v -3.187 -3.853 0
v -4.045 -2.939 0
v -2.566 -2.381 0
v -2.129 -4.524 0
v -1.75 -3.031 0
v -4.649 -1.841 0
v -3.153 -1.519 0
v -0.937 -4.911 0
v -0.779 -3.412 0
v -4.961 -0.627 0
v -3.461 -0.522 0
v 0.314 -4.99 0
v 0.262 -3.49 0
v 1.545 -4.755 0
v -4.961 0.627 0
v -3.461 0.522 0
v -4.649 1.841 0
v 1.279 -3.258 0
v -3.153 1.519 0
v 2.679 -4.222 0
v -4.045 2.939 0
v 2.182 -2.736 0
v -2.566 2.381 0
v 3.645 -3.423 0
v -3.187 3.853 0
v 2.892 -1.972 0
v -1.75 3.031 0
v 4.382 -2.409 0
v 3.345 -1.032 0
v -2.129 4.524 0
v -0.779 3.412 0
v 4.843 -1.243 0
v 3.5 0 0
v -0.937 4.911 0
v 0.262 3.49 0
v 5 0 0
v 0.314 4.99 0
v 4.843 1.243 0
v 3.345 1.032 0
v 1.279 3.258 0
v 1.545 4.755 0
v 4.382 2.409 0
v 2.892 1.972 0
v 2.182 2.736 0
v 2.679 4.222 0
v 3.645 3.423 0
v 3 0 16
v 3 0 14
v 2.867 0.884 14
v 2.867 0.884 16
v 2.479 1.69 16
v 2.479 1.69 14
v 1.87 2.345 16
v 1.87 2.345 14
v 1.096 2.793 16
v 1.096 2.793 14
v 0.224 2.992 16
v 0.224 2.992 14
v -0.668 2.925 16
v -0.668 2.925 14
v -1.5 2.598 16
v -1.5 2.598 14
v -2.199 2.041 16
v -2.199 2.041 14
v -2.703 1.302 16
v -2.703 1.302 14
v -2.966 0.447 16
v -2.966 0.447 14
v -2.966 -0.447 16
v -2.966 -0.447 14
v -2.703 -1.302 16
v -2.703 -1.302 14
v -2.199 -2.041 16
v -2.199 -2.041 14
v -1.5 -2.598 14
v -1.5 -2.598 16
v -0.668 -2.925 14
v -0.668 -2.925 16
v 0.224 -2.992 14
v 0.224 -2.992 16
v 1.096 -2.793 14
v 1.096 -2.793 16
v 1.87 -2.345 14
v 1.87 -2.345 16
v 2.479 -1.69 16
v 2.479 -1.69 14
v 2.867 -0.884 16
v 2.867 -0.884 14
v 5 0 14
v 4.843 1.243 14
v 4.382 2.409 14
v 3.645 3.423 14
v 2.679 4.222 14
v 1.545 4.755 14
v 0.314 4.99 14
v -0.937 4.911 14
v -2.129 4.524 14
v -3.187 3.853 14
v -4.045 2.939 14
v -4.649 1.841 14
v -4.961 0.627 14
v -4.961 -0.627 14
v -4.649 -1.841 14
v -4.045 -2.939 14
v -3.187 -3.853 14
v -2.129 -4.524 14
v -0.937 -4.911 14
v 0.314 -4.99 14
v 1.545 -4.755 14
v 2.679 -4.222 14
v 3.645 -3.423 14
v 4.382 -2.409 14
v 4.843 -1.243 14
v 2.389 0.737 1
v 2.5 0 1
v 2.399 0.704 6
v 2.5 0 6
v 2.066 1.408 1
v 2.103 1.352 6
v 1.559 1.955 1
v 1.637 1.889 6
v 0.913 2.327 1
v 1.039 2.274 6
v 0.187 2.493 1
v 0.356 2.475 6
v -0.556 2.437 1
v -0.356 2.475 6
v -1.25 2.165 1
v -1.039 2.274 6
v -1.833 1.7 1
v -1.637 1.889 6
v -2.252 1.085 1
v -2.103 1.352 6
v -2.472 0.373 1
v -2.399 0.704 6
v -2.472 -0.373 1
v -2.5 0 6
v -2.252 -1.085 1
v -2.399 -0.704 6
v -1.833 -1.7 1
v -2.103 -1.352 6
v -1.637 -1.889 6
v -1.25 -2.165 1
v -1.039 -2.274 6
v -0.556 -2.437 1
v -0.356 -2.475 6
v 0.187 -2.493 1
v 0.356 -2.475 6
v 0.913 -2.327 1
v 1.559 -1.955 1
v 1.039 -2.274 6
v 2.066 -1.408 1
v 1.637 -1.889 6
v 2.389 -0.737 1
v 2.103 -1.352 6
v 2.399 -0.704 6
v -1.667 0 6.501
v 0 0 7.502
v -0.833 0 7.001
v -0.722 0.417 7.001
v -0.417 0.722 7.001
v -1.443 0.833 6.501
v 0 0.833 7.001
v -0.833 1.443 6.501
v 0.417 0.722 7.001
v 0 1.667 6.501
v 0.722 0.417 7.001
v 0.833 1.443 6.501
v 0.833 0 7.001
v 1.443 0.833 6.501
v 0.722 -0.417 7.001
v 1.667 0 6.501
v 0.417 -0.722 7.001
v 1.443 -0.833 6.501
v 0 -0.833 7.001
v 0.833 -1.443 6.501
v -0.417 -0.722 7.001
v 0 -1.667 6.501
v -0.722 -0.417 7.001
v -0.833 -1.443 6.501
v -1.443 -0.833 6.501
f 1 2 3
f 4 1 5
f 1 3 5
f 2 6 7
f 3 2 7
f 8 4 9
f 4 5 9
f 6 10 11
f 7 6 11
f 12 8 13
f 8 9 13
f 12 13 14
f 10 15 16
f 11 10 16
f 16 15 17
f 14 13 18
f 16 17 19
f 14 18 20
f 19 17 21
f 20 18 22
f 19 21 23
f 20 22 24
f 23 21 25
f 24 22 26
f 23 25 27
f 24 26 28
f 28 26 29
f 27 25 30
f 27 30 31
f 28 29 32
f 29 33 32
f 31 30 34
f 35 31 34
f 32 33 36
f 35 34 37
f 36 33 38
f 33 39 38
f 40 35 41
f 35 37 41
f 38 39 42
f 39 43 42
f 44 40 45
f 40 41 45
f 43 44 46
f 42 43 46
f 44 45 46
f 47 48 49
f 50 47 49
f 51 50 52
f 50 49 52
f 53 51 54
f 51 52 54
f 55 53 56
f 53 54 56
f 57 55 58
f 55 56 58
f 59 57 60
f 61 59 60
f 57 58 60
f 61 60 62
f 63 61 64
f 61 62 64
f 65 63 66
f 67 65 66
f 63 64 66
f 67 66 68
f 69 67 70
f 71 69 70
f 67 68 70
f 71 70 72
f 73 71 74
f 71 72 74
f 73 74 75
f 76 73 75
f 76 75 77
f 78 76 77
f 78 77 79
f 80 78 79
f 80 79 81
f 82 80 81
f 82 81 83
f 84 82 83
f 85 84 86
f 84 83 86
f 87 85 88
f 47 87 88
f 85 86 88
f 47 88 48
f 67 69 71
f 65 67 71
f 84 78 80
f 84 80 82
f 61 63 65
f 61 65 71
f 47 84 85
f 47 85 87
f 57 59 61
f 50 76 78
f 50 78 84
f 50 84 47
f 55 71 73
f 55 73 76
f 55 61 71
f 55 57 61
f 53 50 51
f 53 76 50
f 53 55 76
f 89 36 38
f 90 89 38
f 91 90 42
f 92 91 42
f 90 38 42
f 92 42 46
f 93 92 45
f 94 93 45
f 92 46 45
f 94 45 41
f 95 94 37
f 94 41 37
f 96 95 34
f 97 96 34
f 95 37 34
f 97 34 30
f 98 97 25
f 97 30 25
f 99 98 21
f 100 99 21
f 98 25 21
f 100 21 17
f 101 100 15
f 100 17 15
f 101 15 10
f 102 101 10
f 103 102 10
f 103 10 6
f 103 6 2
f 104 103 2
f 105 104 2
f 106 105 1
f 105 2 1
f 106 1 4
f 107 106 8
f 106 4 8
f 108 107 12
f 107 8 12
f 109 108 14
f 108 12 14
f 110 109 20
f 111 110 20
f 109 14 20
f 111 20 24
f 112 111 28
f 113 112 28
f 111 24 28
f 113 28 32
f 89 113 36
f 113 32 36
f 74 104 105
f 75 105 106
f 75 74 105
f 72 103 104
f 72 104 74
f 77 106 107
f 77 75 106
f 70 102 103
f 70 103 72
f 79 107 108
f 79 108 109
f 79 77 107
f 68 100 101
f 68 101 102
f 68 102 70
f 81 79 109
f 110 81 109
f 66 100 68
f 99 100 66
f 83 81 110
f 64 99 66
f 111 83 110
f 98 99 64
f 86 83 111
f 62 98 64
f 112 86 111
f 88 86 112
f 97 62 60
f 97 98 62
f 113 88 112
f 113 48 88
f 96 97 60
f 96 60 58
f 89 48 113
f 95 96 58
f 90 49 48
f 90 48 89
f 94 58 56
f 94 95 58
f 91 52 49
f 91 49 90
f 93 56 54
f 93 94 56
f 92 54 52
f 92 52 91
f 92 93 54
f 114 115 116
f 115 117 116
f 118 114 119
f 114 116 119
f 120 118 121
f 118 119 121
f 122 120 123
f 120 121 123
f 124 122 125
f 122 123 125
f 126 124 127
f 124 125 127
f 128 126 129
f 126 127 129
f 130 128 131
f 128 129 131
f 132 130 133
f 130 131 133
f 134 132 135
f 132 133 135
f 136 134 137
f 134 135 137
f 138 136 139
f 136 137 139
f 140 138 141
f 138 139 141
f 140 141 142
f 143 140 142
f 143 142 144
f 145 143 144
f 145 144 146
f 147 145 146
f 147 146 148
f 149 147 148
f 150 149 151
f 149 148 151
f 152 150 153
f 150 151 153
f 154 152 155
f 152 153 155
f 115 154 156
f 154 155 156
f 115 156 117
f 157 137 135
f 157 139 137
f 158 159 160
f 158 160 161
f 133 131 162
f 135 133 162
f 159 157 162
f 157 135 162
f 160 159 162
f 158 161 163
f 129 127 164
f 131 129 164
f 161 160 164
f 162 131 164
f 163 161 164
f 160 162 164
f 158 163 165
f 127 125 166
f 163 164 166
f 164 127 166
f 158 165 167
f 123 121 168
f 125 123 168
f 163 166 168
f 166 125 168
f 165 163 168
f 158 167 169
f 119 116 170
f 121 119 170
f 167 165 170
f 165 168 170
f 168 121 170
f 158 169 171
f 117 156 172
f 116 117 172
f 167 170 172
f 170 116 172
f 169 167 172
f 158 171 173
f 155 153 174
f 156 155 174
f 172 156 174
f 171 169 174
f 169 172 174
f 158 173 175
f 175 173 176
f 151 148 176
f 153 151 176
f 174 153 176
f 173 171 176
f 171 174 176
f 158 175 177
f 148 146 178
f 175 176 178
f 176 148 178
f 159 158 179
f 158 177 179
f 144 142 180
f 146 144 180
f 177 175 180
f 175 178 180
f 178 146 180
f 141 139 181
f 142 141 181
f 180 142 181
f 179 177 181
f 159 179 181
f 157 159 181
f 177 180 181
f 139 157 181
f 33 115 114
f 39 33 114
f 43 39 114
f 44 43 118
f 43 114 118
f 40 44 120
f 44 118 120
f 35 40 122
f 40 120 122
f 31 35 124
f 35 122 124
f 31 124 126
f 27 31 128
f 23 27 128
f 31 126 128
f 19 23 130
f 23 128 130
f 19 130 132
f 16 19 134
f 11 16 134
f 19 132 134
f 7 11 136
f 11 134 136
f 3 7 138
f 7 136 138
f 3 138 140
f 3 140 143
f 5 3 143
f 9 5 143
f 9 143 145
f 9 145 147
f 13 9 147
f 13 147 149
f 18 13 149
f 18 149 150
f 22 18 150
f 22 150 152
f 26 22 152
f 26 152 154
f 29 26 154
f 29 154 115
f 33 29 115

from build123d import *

# Parameters (mm, degrees)
SCHIZZO1_R                      = 5
ESTRUSIONE_ESTRUSIONE1_DEPTH    = 14
SCHIZZO2_R                      = 3
ESTRUSIONE_ESTRUSIONE2_DEPTH    = 2
FORO_FILETTATO_M6_1_D           = 5
FORO_FILETTATO_M6_1_DEPTH       = 6
FORO_FILETTATO_M6_1_CSINK_D     = 7
FORO_FILETTATO_M6_1_CSINK_ANGLE = 90
FORO_FILETTATO_M6_1_TIP         = 1.502151548


with BuildPart() as part:
    # Schizzo1 → Estrusione-Estrusione1 (new body)
    with BuildSketch(Plane.XY):
        Circle(SCHIZZO1_R)
    extrude(amount=ESTRUSIONE_ESTRUSIONE1_DEPTH)

    # Schizzo2 → Estrusione-Estrusione2 (add)
    with BuildSketch(Plane.XY.offset(14)):
        Circle(SCHIZZO2_R)
    extrude(amount=ESTRUSIONE_ESTRUSIONE2_DEPTH)

    # Foro filettato M6-1
    with Locations(Plane(origin=(0, 0, 0), x_dir=(-1, 0, 0), z_dir=(0, 0, -1))):
        with Locations((0, 0)):
            CounterSinkHole(FORO_FILETTATO_M6_1_D / 2, FORO_FILETTATO_M6_1_CSINK_D / 2, depth=FORO_FILETTATO_M6_1_DEPTH, counter_sink_angle=FORO_FILETTATO_M6_1_CSINK_ANGLE)
            with Locations((0, 0, -(FORO_FILETTATO_M6_1_DEPTH + FORO_FILETTATO_M6_1_TIP / 2))):  # 118° drill point
                Cone(0, FORO_FILETTATO_M6_1_D / 2, FORO_FILETTATO_M6_1_TIP, mode=Mode.SUBTRACT)


solid = part.part
